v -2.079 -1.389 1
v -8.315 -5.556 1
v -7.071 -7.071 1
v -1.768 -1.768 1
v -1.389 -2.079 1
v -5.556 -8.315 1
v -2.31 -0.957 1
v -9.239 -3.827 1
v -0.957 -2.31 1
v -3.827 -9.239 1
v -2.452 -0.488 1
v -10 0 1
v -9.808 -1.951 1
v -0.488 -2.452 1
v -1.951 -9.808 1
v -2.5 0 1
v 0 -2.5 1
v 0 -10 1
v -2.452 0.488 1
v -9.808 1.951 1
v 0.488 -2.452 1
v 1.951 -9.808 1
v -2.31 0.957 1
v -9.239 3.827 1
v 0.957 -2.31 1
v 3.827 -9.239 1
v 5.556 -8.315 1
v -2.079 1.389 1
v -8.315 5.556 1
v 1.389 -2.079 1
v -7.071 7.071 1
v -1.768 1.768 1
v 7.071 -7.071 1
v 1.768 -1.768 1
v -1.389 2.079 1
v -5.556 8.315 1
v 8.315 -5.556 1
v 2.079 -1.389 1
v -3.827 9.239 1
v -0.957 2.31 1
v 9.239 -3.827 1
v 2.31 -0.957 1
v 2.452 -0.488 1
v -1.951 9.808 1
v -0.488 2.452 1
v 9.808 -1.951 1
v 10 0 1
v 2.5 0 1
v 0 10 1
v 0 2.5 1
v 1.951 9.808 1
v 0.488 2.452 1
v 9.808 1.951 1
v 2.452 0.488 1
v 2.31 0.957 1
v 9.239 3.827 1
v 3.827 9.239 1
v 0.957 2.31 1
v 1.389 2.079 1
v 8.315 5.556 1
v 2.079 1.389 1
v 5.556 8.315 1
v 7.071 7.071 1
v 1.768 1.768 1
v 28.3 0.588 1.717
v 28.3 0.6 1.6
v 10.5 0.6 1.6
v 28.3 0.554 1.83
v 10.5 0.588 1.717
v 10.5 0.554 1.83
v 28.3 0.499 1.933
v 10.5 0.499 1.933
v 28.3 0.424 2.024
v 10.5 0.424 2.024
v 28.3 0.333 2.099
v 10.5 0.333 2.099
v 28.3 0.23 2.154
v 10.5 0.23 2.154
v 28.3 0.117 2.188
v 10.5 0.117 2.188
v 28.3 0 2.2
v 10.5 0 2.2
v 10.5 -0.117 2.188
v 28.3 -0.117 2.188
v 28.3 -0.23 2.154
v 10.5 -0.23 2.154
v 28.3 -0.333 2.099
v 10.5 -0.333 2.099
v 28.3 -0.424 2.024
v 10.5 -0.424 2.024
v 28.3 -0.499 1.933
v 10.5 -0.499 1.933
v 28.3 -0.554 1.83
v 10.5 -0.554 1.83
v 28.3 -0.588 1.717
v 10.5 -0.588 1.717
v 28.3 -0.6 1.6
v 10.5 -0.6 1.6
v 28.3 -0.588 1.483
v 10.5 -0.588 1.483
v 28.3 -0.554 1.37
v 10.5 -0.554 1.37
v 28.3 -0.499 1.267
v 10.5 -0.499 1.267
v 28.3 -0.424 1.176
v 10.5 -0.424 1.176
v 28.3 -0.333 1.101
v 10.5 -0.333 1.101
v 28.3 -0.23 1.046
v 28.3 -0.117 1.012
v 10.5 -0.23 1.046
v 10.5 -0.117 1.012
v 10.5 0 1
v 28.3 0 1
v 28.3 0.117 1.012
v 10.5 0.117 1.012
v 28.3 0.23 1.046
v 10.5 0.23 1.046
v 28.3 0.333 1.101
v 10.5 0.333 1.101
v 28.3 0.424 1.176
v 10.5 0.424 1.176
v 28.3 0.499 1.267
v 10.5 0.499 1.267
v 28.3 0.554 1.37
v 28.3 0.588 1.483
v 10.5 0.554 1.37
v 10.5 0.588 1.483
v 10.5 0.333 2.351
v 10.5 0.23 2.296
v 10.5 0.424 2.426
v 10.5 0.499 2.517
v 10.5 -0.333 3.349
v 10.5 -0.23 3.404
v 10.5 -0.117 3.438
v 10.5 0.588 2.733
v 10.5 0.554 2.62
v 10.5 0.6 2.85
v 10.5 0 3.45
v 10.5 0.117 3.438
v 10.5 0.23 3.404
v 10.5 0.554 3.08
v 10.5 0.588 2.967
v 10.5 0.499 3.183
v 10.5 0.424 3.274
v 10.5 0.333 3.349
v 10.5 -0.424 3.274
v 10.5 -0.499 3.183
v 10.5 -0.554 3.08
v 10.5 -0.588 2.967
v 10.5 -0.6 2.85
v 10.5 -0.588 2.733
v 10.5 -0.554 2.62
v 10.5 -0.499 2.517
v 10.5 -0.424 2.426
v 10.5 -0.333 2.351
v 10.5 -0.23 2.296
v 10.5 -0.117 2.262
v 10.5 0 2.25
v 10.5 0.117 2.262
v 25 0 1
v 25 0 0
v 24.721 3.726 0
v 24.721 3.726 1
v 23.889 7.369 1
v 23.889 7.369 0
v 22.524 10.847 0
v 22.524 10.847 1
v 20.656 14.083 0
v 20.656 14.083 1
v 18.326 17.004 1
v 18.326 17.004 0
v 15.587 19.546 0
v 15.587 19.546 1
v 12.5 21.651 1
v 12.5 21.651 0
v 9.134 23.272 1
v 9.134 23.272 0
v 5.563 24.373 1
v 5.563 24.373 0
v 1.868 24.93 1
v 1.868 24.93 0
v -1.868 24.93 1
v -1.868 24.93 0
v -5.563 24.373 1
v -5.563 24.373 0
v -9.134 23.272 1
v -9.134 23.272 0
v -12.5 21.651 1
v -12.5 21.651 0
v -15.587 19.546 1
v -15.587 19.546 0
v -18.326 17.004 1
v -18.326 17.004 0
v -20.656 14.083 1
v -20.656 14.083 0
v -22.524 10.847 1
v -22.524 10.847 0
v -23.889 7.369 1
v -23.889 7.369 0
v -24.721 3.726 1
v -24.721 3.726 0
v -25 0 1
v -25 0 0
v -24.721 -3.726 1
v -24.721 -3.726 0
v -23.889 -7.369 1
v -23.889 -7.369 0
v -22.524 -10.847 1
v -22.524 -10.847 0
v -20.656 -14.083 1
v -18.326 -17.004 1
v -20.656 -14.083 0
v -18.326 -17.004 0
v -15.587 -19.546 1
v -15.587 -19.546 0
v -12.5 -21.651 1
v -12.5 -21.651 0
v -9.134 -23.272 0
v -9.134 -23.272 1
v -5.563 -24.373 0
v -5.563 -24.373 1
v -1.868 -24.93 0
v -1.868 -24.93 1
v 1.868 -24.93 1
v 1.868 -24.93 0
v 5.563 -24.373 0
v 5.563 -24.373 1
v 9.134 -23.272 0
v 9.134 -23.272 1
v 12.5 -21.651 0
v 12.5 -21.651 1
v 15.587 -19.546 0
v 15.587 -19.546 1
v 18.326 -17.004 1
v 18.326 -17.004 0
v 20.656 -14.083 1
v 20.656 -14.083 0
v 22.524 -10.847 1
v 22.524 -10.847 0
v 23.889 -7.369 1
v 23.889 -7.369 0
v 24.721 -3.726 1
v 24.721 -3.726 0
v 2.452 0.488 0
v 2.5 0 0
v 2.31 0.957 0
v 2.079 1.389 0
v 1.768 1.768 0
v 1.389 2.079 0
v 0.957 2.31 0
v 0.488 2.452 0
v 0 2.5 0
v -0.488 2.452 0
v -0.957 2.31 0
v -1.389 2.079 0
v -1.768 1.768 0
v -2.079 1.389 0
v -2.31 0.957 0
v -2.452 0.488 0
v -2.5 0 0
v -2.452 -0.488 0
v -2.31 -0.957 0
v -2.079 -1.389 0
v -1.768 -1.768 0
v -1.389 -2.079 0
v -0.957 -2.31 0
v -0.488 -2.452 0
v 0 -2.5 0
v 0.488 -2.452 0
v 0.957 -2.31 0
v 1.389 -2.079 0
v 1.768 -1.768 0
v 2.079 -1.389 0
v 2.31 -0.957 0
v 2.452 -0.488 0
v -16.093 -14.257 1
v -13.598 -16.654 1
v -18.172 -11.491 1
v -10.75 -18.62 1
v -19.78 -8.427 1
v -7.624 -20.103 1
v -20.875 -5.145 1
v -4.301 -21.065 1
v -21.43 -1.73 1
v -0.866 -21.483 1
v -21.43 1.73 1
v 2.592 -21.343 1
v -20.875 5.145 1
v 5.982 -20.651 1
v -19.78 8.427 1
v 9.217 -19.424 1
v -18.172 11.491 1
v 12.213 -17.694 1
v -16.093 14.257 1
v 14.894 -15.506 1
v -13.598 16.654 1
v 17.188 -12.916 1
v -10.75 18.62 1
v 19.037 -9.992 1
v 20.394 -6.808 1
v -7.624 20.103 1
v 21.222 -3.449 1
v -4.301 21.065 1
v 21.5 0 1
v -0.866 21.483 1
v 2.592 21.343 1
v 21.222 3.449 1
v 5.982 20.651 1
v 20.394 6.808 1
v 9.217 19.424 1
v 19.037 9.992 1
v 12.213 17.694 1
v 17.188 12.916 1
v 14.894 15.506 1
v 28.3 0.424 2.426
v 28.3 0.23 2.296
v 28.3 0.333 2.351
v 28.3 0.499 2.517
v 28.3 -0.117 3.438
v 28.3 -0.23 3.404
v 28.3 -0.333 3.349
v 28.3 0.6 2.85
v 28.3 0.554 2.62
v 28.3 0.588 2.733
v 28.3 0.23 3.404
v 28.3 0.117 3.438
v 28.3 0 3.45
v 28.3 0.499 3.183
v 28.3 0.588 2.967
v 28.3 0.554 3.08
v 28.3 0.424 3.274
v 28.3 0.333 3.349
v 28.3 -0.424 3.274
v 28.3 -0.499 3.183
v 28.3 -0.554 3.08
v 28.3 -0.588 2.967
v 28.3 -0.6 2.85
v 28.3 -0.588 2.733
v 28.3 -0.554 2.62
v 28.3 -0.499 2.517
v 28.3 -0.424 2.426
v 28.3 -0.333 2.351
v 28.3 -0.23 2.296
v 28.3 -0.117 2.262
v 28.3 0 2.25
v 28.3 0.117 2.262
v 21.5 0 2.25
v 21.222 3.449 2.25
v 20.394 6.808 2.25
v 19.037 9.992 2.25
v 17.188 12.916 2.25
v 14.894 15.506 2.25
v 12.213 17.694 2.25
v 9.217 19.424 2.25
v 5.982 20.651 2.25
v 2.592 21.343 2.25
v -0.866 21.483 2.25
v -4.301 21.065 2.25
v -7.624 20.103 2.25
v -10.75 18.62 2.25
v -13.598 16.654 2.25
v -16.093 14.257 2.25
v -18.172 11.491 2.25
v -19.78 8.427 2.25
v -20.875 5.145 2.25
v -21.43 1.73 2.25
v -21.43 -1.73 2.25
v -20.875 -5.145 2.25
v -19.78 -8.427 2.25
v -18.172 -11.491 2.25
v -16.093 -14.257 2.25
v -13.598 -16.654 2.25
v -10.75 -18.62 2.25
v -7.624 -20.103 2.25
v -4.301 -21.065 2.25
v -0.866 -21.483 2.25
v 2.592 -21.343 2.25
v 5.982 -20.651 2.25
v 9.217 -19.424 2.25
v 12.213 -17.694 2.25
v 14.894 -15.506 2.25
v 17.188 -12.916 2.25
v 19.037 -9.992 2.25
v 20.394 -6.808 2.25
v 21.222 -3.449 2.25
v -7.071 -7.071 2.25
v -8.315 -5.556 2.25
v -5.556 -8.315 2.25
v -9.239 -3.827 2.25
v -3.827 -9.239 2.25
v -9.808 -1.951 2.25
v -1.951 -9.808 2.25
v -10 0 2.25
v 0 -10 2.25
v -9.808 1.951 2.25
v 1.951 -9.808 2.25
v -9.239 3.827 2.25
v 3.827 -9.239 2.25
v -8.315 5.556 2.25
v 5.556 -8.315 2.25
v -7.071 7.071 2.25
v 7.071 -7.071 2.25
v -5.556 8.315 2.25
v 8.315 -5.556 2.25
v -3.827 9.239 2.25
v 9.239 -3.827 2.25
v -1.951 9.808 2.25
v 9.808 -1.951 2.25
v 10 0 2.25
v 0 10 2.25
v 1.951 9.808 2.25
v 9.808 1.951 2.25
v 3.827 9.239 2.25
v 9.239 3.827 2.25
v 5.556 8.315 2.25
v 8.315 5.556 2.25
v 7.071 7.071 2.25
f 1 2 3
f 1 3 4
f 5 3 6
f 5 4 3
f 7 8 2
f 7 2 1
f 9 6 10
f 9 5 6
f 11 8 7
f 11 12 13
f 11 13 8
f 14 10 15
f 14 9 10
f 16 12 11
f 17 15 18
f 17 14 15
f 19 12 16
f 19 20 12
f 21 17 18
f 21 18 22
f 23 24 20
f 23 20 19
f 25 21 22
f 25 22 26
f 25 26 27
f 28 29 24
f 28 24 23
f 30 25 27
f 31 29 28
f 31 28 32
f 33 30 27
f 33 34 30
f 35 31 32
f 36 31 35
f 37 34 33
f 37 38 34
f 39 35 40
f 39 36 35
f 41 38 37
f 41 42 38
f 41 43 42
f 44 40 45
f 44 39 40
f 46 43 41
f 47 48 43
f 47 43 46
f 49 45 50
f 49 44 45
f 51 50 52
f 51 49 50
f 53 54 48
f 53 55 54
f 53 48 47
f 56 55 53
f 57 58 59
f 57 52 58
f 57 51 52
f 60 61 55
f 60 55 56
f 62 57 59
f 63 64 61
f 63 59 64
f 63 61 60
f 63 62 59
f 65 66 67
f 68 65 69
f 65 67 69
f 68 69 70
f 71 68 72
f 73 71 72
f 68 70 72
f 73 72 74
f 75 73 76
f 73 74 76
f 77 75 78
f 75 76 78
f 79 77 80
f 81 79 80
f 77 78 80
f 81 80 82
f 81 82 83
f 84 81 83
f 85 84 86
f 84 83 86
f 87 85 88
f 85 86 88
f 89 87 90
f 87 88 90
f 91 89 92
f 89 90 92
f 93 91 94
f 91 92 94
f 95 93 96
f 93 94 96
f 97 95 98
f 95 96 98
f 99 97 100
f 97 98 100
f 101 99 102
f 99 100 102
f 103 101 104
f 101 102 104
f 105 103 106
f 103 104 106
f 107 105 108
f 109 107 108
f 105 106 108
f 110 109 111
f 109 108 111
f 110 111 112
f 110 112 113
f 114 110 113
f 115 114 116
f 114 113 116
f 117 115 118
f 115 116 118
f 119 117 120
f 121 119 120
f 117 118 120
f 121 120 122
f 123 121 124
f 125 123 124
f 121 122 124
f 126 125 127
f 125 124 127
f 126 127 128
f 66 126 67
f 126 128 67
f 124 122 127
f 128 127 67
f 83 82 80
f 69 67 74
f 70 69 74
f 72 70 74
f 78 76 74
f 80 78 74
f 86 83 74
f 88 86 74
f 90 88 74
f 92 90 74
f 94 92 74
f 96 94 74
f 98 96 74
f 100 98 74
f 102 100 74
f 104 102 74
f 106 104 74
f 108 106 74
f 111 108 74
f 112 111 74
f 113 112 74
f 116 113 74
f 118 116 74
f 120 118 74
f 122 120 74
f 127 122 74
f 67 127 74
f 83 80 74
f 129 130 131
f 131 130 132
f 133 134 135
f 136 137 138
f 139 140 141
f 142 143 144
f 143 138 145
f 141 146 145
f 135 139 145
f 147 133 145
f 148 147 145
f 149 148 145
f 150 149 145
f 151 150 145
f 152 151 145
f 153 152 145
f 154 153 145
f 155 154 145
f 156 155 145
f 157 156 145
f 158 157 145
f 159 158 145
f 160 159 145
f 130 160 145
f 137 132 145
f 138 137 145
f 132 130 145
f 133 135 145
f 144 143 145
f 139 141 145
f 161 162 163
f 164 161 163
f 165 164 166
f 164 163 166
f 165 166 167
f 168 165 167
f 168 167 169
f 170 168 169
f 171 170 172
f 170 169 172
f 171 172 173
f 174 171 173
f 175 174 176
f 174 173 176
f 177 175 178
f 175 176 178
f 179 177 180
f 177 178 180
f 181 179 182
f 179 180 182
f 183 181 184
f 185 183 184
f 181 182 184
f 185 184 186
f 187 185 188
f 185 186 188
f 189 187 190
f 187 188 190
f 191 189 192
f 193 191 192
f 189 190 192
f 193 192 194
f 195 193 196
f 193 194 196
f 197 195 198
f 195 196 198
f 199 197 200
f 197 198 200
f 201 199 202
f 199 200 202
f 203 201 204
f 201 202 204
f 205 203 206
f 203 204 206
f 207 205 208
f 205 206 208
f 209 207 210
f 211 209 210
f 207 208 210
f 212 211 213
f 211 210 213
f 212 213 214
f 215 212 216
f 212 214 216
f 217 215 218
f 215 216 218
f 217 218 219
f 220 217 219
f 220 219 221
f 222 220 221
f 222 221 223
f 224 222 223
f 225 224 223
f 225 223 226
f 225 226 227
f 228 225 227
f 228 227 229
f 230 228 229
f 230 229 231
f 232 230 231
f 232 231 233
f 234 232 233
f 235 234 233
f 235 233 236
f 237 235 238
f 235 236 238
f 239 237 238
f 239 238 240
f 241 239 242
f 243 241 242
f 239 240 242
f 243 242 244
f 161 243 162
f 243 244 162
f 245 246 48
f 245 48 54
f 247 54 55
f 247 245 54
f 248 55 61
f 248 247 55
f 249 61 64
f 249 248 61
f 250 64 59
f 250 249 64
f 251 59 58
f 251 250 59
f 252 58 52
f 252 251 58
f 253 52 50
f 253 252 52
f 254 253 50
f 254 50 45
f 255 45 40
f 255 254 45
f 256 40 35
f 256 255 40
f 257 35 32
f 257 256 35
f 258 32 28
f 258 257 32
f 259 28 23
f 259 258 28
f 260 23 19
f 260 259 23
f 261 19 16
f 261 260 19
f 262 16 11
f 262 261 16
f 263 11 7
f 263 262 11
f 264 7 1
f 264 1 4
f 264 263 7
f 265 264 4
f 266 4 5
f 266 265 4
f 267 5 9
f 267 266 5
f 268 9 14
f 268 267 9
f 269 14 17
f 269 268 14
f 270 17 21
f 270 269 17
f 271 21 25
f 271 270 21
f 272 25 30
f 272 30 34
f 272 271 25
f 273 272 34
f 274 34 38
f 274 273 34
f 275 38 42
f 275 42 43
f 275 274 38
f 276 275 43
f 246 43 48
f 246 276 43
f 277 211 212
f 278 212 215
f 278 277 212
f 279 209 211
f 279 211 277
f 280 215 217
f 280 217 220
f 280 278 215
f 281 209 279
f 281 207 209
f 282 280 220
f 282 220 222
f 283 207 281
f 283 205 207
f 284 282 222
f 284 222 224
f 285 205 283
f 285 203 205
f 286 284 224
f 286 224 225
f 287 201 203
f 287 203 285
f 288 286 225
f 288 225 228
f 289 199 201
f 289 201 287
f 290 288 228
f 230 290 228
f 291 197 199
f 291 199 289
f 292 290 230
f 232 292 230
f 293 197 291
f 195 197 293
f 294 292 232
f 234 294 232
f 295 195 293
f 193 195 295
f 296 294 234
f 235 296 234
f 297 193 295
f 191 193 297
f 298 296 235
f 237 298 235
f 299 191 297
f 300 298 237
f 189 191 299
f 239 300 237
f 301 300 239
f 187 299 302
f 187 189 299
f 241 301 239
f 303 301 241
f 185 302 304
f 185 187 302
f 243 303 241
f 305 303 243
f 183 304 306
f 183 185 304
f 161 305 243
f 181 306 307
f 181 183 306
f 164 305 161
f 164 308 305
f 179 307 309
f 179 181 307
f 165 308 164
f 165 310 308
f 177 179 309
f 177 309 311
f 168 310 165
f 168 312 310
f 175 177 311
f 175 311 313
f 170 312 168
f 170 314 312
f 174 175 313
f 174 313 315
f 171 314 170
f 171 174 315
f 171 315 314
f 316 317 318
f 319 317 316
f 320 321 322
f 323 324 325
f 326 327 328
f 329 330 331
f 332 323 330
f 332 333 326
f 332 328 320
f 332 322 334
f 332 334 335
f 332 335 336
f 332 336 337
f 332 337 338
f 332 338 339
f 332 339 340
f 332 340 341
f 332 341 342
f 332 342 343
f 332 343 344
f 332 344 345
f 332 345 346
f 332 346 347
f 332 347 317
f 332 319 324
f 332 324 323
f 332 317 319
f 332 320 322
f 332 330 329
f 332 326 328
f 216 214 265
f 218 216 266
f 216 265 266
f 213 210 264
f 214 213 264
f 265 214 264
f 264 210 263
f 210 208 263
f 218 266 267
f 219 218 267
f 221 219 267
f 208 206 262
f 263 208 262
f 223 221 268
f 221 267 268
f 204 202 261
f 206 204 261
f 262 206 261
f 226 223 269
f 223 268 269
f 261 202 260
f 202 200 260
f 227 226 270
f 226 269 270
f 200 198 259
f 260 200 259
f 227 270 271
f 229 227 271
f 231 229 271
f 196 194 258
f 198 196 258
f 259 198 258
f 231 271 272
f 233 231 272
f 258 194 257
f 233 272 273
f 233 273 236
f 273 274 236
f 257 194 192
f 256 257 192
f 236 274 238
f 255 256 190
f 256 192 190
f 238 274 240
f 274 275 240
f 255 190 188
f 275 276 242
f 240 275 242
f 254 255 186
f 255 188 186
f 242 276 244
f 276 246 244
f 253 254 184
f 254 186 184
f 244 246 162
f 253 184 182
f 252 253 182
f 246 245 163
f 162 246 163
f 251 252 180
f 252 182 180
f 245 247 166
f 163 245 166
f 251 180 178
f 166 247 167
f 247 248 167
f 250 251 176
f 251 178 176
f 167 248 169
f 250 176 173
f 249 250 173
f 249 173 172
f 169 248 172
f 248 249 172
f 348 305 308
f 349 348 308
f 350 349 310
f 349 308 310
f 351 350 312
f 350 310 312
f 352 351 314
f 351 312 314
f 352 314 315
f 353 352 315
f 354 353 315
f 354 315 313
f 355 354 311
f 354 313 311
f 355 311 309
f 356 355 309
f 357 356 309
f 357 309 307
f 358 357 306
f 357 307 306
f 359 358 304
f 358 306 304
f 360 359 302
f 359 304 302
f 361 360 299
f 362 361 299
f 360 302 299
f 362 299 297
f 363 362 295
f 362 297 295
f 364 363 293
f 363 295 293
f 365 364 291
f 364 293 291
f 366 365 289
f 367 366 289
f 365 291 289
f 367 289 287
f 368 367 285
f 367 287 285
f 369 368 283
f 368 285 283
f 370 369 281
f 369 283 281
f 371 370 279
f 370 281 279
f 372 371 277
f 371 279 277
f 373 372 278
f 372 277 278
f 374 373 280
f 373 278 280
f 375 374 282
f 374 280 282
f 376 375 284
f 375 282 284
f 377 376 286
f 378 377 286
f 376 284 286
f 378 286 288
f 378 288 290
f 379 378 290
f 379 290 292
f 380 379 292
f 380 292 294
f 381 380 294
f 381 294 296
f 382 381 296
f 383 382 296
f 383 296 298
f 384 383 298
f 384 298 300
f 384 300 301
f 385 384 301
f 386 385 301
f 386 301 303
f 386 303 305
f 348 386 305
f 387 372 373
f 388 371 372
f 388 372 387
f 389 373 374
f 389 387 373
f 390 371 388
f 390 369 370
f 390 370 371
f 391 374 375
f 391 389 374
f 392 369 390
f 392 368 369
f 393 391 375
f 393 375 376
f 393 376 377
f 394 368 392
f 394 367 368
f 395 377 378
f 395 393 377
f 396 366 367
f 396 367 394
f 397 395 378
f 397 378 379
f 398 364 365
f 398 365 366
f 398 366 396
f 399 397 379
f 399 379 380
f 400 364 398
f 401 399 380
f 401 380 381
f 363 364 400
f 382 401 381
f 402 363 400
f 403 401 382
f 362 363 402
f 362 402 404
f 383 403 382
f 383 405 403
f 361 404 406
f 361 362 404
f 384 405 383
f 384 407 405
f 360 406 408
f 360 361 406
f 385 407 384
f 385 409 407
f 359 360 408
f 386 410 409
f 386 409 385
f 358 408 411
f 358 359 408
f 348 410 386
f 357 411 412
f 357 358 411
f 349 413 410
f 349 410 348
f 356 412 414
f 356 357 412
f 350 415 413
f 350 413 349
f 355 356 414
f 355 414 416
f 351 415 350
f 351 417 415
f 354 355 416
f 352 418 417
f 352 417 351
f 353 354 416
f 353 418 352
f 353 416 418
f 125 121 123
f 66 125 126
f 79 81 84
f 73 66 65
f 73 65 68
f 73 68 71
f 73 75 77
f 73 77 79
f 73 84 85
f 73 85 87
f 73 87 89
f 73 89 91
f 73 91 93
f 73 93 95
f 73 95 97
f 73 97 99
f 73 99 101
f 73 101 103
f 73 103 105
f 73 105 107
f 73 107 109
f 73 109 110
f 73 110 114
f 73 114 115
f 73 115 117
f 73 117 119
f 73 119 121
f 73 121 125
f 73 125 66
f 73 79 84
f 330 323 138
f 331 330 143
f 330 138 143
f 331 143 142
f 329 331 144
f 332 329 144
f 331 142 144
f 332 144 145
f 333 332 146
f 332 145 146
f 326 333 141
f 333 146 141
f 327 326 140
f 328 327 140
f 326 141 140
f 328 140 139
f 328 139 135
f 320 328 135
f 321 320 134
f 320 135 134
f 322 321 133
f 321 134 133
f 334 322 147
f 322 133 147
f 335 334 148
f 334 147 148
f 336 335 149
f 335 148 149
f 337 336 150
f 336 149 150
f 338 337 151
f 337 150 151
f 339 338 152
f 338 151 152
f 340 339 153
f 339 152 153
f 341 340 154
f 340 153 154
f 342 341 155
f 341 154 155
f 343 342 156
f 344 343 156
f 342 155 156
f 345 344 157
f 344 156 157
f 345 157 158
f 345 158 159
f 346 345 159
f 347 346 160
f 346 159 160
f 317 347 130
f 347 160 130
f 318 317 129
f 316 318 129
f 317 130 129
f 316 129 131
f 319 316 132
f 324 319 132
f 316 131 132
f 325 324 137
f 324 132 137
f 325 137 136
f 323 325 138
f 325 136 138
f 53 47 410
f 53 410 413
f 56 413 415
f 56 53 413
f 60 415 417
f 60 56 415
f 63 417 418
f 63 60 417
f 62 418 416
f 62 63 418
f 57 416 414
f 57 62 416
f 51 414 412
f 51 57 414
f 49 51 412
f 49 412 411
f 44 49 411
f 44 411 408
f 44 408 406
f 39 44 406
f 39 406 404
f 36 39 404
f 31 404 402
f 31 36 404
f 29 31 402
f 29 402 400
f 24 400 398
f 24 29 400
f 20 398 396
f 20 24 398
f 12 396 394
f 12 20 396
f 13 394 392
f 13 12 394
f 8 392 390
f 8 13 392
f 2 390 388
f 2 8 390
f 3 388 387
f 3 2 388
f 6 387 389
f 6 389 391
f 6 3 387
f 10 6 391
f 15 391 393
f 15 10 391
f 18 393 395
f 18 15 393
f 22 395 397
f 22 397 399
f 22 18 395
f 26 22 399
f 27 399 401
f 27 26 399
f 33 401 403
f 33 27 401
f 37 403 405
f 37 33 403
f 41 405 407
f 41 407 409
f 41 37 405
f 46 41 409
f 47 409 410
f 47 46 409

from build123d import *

# Parameters (mm, degrees)
F0_R     = 25
F0_R_2   = 2.5
F1_DEPTH = 1
F2_R     = 21.5
F2_R_2   = 10
F3_DEPTH = 1.25
F5_START = 10.5
F4_R     = 0.6
F5_DEPTH = 17.8


with BuildPart() as f1:
    # F0 (on Top) → F1 (new body)
    with BuildSketch(Plane.XY):
        Circle(F0_R)
        Circle(F0_R_2, mode=Mode.SUBTRACT)
    extrude(amount=F1_DEPTH)

    # F2 (on face) → F3 (join)
    with BuildSketch(Plane.XY.offset(1)):
        Circle(F2_R)
        Circle(F2_R_2, mode=Mode.SUBTRACT)
    extrude(amount=F3_DEPTH)


with BuildPart() as f5:
    # F4 (on Right) → F5 (new body)
    with BuildSketch(Plane.YZ.offset(F5_START)):
        with Locations((0, 1.6)):
            Circle(F4_R)
    extrude(amount=F5_DEPTH)


with BuildPart() as f5b:
    # F4 (on Right) → F5, piece 2 (new body)
    with BuildSketch(Plane.YZ.offset(F5_START)):
        with Locations((0, 2.85)):
            Circle(F4_R)
    extrude(amount=F5_DEPTH)


solid = Compound([f1.part, f5.part, f5b.part])
